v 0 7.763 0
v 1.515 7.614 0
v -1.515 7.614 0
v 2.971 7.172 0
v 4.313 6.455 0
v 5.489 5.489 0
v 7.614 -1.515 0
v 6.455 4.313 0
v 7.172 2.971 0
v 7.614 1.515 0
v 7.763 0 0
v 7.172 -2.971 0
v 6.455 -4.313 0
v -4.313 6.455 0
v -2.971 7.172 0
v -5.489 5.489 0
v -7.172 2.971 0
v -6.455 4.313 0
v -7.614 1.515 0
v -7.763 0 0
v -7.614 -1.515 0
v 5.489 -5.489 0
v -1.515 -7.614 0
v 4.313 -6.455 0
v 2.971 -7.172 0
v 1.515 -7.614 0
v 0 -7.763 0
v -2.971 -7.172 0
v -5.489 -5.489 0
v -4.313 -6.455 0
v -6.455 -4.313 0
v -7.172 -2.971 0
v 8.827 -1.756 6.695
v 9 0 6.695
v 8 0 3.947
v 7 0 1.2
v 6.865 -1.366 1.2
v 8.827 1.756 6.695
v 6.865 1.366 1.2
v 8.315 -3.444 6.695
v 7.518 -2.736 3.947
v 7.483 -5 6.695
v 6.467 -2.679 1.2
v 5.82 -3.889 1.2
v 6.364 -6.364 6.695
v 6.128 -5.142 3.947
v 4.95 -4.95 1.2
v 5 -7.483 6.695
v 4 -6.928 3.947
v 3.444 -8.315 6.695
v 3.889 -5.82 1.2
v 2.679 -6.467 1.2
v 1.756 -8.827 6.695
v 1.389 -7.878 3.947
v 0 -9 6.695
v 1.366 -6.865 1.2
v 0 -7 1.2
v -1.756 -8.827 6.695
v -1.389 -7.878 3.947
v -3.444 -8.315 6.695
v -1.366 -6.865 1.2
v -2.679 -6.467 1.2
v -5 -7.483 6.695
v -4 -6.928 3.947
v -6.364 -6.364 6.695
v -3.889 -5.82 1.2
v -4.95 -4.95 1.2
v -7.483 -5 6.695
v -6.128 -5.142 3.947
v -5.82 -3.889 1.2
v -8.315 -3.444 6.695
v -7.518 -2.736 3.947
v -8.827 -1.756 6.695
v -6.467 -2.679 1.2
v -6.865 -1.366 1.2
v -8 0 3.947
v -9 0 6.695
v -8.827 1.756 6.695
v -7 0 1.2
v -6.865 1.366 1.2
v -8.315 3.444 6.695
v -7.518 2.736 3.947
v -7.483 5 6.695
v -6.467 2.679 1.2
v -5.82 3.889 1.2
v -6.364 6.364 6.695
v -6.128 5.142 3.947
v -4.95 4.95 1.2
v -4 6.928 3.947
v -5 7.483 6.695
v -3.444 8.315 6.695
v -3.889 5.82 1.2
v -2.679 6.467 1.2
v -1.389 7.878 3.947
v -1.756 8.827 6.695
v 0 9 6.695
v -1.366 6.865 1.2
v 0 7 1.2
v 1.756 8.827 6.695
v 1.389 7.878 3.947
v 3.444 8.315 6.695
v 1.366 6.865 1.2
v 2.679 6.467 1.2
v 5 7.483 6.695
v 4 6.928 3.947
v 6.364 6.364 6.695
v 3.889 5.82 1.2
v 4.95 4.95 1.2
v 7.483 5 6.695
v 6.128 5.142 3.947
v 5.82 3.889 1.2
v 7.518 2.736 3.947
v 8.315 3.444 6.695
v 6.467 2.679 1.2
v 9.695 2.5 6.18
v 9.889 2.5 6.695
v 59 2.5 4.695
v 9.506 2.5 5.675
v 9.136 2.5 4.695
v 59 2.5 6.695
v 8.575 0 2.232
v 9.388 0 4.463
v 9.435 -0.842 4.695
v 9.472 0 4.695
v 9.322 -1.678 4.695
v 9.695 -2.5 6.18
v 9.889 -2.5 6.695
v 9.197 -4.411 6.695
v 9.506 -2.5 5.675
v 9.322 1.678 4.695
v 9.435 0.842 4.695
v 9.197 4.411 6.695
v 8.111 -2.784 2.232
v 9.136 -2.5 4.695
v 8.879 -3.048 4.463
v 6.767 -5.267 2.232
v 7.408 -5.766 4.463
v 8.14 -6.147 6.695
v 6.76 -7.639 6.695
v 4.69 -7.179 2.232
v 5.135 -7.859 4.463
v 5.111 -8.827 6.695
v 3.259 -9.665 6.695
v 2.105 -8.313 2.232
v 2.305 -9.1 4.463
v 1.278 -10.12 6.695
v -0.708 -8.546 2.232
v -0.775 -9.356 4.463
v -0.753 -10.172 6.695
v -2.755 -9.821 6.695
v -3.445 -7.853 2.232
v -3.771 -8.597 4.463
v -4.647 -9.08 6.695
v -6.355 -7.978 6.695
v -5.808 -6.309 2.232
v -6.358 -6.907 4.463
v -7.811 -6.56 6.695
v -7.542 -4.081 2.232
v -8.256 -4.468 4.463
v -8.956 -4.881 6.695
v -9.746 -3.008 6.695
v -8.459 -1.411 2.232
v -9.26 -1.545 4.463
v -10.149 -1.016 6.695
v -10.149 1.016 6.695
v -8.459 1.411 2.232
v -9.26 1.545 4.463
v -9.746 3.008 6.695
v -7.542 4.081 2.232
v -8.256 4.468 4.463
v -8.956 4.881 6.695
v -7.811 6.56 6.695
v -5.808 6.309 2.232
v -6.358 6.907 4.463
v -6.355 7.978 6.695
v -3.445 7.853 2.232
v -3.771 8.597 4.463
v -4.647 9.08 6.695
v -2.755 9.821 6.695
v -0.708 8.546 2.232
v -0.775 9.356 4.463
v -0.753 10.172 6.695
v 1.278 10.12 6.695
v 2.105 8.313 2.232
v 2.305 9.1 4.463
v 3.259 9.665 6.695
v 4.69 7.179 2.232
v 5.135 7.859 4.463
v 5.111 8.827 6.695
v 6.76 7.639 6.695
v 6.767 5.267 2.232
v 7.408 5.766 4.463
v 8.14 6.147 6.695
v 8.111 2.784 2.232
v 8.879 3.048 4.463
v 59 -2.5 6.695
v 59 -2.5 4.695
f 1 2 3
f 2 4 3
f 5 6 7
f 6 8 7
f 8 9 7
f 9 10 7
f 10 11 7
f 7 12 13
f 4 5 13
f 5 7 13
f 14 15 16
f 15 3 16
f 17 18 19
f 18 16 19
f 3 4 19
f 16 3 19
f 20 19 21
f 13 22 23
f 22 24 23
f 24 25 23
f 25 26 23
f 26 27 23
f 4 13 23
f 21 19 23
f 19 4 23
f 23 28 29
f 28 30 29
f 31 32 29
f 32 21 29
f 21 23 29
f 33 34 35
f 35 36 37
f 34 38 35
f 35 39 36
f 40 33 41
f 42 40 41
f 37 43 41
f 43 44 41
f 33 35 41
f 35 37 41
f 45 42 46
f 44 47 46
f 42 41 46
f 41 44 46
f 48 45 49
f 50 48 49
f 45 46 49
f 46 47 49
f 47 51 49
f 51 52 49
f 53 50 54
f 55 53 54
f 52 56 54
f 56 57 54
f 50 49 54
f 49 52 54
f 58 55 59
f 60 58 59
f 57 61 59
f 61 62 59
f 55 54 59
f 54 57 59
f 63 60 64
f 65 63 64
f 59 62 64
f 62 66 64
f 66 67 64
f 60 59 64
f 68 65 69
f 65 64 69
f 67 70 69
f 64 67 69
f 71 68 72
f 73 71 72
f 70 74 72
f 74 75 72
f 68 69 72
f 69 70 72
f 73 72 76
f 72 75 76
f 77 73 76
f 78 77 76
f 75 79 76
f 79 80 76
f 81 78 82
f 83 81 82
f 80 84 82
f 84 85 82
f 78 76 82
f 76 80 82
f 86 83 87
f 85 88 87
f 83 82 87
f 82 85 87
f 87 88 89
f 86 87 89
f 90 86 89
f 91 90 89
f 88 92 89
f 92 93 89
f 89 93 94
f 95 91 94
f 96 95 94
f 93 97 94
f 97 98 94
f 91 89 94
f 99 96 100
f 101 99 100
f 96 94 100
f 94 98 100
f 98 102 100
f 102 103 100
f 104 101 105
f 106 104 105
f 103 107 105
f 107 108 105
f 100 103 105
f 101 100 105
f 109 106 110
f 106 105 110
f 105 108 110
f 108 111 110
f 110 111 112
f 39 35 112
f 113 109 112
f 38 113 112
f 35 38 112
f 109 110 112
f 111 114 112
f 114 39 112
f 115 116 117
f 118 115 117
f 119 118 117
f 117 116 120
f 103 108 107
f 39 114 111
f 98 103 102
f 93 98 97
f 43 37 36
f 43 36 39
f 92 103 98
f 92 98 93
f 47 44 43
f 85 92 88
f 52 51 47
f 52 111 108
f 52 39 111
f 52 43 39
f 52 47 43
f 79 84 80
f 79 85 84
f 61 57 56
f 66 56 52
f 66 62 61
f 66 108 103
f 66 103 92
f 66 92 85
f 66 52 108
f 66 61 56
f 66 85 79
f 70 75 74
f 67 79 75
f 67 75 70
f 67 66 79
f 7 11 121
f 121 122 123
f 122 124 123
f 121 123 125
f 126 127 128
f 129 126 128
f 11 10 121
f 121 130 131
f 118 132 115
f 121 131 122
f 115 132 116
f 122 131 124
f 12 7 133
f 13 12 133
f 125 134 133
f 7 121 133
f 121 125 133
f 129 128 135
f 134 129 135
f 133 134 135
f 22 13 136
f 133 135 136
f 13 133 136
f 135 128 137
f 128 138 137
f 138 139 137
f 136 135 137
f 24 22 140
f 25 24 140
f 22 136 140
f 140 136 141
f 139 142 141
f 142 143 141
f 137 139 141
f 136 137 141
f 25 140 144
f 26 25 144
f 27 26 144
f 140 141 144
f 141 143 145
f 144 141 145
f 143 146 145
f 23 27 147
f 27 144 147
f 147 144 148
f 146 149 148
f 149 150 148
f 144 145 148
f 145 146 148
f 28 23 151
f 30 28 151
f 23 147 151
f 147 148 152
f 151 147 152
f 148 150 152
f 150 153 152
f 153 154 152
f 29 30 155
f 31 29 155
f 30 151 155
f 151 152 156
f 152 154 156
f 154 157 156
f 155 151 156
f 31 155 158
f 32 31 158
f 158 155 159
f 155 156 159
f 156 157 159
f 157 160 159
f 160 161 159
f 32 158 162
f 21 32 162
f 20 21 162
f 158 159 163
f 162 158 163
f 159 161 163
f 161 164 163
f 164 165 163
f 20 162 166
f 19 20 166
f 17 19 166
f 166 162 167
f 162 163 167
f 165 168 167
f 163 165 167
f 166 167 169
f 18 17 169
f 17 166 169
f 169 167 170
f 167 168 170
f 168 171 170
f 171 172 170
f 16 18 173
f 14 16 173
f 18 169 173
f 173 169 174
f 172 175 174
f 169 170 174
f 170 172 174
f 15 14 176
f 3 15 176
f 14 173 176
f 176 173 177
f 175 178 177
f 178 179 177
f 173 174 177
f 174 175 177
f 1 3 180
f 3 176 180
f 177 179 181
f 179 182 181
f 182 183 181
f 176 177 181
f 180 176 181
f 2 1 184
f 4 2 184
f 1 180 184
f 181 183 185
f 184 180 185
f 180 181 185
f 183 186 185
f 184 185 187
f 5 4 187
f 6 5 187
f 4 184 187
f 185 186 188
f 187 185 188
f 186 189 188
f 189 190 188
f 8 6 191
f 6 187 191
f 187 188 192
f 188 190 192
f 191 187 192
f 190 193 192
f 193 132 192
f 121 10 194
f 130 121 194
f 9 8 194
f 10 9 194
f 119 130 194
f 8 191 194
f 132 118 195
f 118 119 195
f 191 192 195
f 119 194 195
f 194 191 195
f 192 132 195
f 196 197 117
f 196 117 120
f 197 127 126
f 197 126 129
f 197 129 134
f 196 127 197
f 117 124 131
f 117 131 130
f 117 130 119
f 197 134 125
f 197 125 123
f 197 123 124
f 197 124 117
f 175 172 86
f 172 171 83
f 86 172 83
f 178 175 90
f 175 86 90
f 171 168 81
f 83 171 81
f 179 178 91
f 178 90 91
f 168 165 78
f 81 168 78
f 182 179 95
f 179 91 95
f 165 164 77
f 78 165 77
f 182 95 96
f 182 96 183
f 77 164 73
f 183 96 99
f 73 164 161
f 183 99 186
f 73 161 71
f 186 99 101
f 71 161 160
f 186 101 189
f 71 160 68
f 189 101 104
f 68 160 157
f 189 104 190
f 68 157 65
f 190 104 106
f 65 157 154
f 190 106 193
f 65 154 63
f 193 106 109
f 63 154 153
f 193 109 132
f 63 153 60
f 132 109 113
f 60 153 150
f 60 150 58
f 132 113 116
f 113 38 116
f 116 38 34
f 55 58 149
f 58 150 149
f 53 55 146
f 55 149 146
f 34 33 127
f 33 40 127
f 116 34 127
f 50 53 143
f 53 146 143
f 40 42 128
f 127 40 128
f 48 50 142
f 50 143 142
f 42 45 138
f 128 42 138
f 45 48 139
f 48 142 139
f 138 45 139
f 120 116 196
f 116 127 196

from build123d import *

# Parameters (mm, degrees)
F0_W     = 7
F0_H     = 1.2
F2_W     = 50
F2_H     = 2
F3_DEPTH = 2.5


with BuildPart() as f1:
    # F0 (on Front) → F1 (revolve)
    with BuildSketch(Plane.XZ):
        Polygon((9, 6.694955), (7, 1.2), (7, 0), (7.763236, 0), (10.2, 6.694955), align=None)
        with Locations((3.5, 0.6)):
            Rectangle(F0_W, F0_H)
    revolve(axis=Axis((0, 0, 3.216552), (0, 0, -1)))

    # F2 (on Front) → F3 (join, symmetric)
    with BuildSketch(Plane.XZ):
        with Locations((34, 5.694955)):
            Rectangle(F2_W, F2_H)
    extrude(amount=F3_DEPTH, both=True)


solid = f1.part
